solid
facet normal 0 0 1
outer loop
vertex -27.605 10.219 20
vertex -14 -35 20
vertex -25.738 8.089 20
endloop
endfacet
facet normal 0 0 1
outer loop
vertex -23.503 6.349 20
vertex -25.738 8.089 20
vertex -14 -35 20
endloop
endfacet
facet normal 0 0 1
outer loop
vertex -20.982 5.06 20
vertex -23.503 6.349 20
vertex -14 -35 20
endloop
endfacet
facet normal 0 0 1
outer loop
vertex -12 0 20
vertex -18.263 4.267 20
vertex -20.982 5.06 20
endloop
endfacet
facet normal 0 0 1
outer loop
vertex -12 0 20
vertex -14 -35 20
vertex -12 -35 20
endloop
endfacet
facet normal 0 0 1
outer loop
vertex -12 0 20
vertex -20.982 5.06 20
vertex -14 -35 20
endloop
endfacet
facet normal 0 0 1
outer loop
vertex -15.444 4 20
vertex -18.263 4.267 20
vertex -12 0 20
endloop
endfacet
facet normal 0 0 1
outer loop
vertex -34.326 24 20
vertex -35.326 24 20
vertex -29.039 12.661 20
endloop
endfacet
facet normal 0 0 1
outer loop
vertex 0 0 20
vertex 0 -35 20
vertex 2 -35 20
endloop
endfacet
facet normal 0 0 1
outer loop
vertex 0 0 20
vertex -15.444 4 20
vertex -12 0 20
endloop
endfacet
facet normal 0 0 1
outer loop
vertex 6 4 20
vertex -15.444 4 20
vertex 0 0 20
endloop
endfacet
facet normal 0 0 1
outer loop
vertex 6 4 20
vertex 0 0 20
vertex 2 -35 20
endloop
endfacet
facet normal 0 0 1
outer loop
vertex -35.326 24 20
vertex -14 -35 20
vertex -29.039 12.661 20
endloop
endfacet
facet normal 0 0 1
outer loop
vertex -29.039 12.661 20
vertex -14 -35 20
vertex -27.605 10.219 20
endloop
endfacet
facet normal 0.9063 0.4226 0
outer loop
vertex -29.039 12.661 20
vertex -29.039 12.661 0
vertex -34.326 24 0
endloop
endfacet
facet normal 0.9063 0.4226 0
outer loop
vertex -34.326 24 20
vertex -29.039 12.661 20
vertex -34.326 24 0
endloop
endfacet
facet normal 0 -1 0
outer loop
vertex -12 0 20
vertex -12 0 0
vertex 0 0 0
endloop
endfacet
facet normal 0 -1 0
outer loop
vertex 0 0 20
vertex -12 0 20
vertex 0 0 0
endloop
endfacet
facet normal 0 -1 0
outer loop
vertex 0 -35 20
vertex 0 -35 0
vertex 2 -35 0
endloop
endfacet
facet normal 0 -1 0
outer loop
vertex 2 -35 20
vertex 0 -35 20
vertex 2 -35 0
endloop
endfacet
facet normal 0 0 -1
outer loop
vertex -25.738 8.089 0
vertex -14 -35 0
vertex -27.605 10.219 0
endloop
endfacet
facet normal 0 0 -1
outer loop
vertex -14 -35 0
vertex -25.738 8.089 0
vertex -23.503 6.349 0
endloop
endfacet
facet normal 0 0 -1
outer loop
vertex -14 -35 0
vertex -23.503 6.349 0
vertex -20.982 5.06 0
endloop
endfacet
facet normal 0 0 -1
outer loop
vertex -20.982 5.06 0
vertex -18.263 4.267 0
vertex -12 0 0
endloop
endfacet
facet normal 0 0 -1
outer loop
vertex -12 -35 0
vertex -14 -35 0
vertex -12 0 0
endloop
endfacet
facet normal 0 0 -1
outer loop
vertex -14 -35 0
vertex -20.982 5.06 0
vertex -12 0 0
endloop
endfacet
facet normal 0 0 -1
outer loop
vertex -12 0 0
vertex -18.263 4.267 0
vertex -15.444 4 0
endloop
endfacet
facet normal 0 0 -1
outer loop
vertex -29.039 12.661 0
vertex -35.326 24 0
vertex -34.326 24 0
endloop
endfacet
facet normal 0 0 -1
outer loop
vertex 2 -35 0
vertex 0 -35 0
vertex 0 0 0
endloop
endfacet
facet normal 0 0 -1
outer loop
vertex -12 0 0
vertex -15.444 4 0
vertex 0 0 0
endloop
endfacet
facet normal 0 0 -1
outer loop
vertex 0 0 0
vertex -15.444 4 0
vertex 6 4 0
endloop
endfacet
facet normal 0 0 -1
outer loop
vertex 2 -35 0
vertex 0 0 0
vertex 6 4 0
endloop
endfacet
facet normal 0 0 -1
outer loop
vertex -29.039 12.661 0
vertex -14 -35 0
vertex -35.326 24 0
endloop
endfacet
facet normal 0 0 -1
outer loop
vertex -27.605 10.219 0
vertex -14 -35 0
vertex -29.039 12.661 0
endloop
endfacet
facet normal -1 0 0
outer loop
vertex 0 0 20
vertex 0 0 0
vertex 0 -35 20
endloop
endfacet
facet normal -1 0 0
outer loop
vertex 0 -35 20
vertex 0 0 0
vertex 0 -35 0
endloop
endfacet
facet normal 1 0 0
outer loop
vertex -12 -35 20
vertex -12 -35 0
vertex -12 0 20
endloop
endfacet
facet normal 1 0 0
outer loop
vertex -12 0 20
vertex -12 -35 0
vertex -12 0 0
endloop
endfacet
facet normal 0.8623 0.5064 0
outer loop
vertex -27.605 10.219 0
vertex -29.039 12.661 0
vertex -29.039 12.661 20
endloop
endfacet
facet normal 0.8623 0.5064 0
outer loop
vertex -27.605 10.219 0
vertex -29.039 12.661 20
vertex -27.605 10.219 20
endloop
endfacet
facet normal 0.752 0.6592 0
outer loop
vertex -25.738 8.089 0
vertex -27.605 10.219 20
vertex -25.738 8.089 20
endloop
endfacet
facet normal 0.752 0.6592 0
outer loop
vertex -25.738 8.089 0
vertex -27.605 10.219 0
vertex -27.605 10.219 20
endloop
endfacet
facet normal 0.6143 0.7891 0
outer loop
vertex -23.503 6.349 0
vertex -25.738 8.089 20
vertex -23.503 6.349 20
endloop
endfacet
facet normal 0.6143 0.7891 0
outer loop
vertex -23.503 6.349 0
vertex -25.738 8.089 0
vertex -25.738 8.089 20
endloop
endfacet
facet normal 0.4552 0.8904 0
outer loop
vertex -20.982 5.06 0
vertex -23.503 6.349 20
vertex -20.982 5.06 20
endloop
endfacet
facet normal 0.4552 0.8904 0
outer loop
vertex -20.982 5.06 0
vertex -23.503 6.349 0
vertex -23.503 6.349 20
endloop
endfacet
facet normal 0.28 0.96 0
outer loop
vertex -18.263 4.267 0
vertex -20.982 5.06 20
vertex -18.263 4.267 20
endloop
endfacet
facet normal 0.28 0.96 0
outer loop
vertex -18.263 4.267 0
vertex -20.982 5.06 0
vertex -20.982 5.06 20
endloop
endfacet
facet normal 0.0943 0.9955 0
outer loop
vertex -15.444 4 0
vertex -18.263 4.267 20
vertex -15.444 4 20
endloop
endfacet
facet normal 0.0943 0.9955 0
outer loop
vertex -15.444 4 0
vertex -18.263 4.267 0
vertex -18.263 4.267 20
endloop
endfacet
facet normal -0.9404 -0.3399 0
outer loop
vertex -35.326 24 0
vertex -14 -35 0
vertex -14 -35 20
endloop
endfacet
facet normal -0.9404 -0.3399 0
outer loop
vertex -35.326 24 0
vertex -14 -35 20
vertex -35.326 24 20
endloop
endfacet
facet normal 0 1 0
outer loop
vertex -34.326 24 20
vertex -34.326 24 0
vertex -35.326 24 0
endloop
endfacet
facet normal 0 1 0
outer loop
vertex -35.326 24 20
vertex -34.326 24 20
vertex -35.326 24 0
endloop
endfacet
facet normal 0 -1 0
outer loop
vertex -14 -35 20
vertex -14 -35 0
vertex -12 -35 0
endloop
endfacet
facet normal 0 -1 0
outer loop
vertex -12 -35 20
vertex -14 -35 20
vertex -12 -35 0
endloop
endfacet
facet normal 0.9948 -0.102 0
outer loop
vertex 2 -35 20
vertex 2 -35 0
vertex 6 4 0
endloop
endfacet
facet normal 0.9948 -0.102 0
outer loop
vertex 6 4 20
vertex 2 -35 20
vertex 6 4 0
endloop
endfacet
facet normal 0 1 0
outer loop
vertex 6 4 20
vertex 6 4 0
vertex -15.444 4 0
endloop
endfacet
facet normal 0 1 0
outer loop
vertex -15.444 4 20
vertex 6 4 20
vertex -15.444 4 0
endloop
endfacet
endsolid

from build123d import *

# Parameters (mm, degrees)
PAD_DEPTH = 20


with BuildPart() as part:
    # Sketch → Pad (new body)
    with BuildSketch(Plane.XY):
        with BuildLine():
            Line((0, 0), (0, -35))
            Line((0, -35), (2, -35))
            Line((2, -35), (6, 4))
            Line((6, 4), (-15.443946, 4))
            ThreePointArc((-29.038563, 12.660726), (-23.50344, 6.349128), (-15.443946, 4))
            Line((-29.038563, 12.660726), (-34.326153, 24))
            Line((-34.326153, 24), (-35.326153, 24))
            Line((-14, -35), (-35.326153, 24))
            Line((-14, -35), (-12, -35))
            Line((-12, -35), (-12, 0))
            Line((-12, 0), (0, 0))
        make_face()
    extrude(amount=PAD_DEPTH)


solid = part.part
